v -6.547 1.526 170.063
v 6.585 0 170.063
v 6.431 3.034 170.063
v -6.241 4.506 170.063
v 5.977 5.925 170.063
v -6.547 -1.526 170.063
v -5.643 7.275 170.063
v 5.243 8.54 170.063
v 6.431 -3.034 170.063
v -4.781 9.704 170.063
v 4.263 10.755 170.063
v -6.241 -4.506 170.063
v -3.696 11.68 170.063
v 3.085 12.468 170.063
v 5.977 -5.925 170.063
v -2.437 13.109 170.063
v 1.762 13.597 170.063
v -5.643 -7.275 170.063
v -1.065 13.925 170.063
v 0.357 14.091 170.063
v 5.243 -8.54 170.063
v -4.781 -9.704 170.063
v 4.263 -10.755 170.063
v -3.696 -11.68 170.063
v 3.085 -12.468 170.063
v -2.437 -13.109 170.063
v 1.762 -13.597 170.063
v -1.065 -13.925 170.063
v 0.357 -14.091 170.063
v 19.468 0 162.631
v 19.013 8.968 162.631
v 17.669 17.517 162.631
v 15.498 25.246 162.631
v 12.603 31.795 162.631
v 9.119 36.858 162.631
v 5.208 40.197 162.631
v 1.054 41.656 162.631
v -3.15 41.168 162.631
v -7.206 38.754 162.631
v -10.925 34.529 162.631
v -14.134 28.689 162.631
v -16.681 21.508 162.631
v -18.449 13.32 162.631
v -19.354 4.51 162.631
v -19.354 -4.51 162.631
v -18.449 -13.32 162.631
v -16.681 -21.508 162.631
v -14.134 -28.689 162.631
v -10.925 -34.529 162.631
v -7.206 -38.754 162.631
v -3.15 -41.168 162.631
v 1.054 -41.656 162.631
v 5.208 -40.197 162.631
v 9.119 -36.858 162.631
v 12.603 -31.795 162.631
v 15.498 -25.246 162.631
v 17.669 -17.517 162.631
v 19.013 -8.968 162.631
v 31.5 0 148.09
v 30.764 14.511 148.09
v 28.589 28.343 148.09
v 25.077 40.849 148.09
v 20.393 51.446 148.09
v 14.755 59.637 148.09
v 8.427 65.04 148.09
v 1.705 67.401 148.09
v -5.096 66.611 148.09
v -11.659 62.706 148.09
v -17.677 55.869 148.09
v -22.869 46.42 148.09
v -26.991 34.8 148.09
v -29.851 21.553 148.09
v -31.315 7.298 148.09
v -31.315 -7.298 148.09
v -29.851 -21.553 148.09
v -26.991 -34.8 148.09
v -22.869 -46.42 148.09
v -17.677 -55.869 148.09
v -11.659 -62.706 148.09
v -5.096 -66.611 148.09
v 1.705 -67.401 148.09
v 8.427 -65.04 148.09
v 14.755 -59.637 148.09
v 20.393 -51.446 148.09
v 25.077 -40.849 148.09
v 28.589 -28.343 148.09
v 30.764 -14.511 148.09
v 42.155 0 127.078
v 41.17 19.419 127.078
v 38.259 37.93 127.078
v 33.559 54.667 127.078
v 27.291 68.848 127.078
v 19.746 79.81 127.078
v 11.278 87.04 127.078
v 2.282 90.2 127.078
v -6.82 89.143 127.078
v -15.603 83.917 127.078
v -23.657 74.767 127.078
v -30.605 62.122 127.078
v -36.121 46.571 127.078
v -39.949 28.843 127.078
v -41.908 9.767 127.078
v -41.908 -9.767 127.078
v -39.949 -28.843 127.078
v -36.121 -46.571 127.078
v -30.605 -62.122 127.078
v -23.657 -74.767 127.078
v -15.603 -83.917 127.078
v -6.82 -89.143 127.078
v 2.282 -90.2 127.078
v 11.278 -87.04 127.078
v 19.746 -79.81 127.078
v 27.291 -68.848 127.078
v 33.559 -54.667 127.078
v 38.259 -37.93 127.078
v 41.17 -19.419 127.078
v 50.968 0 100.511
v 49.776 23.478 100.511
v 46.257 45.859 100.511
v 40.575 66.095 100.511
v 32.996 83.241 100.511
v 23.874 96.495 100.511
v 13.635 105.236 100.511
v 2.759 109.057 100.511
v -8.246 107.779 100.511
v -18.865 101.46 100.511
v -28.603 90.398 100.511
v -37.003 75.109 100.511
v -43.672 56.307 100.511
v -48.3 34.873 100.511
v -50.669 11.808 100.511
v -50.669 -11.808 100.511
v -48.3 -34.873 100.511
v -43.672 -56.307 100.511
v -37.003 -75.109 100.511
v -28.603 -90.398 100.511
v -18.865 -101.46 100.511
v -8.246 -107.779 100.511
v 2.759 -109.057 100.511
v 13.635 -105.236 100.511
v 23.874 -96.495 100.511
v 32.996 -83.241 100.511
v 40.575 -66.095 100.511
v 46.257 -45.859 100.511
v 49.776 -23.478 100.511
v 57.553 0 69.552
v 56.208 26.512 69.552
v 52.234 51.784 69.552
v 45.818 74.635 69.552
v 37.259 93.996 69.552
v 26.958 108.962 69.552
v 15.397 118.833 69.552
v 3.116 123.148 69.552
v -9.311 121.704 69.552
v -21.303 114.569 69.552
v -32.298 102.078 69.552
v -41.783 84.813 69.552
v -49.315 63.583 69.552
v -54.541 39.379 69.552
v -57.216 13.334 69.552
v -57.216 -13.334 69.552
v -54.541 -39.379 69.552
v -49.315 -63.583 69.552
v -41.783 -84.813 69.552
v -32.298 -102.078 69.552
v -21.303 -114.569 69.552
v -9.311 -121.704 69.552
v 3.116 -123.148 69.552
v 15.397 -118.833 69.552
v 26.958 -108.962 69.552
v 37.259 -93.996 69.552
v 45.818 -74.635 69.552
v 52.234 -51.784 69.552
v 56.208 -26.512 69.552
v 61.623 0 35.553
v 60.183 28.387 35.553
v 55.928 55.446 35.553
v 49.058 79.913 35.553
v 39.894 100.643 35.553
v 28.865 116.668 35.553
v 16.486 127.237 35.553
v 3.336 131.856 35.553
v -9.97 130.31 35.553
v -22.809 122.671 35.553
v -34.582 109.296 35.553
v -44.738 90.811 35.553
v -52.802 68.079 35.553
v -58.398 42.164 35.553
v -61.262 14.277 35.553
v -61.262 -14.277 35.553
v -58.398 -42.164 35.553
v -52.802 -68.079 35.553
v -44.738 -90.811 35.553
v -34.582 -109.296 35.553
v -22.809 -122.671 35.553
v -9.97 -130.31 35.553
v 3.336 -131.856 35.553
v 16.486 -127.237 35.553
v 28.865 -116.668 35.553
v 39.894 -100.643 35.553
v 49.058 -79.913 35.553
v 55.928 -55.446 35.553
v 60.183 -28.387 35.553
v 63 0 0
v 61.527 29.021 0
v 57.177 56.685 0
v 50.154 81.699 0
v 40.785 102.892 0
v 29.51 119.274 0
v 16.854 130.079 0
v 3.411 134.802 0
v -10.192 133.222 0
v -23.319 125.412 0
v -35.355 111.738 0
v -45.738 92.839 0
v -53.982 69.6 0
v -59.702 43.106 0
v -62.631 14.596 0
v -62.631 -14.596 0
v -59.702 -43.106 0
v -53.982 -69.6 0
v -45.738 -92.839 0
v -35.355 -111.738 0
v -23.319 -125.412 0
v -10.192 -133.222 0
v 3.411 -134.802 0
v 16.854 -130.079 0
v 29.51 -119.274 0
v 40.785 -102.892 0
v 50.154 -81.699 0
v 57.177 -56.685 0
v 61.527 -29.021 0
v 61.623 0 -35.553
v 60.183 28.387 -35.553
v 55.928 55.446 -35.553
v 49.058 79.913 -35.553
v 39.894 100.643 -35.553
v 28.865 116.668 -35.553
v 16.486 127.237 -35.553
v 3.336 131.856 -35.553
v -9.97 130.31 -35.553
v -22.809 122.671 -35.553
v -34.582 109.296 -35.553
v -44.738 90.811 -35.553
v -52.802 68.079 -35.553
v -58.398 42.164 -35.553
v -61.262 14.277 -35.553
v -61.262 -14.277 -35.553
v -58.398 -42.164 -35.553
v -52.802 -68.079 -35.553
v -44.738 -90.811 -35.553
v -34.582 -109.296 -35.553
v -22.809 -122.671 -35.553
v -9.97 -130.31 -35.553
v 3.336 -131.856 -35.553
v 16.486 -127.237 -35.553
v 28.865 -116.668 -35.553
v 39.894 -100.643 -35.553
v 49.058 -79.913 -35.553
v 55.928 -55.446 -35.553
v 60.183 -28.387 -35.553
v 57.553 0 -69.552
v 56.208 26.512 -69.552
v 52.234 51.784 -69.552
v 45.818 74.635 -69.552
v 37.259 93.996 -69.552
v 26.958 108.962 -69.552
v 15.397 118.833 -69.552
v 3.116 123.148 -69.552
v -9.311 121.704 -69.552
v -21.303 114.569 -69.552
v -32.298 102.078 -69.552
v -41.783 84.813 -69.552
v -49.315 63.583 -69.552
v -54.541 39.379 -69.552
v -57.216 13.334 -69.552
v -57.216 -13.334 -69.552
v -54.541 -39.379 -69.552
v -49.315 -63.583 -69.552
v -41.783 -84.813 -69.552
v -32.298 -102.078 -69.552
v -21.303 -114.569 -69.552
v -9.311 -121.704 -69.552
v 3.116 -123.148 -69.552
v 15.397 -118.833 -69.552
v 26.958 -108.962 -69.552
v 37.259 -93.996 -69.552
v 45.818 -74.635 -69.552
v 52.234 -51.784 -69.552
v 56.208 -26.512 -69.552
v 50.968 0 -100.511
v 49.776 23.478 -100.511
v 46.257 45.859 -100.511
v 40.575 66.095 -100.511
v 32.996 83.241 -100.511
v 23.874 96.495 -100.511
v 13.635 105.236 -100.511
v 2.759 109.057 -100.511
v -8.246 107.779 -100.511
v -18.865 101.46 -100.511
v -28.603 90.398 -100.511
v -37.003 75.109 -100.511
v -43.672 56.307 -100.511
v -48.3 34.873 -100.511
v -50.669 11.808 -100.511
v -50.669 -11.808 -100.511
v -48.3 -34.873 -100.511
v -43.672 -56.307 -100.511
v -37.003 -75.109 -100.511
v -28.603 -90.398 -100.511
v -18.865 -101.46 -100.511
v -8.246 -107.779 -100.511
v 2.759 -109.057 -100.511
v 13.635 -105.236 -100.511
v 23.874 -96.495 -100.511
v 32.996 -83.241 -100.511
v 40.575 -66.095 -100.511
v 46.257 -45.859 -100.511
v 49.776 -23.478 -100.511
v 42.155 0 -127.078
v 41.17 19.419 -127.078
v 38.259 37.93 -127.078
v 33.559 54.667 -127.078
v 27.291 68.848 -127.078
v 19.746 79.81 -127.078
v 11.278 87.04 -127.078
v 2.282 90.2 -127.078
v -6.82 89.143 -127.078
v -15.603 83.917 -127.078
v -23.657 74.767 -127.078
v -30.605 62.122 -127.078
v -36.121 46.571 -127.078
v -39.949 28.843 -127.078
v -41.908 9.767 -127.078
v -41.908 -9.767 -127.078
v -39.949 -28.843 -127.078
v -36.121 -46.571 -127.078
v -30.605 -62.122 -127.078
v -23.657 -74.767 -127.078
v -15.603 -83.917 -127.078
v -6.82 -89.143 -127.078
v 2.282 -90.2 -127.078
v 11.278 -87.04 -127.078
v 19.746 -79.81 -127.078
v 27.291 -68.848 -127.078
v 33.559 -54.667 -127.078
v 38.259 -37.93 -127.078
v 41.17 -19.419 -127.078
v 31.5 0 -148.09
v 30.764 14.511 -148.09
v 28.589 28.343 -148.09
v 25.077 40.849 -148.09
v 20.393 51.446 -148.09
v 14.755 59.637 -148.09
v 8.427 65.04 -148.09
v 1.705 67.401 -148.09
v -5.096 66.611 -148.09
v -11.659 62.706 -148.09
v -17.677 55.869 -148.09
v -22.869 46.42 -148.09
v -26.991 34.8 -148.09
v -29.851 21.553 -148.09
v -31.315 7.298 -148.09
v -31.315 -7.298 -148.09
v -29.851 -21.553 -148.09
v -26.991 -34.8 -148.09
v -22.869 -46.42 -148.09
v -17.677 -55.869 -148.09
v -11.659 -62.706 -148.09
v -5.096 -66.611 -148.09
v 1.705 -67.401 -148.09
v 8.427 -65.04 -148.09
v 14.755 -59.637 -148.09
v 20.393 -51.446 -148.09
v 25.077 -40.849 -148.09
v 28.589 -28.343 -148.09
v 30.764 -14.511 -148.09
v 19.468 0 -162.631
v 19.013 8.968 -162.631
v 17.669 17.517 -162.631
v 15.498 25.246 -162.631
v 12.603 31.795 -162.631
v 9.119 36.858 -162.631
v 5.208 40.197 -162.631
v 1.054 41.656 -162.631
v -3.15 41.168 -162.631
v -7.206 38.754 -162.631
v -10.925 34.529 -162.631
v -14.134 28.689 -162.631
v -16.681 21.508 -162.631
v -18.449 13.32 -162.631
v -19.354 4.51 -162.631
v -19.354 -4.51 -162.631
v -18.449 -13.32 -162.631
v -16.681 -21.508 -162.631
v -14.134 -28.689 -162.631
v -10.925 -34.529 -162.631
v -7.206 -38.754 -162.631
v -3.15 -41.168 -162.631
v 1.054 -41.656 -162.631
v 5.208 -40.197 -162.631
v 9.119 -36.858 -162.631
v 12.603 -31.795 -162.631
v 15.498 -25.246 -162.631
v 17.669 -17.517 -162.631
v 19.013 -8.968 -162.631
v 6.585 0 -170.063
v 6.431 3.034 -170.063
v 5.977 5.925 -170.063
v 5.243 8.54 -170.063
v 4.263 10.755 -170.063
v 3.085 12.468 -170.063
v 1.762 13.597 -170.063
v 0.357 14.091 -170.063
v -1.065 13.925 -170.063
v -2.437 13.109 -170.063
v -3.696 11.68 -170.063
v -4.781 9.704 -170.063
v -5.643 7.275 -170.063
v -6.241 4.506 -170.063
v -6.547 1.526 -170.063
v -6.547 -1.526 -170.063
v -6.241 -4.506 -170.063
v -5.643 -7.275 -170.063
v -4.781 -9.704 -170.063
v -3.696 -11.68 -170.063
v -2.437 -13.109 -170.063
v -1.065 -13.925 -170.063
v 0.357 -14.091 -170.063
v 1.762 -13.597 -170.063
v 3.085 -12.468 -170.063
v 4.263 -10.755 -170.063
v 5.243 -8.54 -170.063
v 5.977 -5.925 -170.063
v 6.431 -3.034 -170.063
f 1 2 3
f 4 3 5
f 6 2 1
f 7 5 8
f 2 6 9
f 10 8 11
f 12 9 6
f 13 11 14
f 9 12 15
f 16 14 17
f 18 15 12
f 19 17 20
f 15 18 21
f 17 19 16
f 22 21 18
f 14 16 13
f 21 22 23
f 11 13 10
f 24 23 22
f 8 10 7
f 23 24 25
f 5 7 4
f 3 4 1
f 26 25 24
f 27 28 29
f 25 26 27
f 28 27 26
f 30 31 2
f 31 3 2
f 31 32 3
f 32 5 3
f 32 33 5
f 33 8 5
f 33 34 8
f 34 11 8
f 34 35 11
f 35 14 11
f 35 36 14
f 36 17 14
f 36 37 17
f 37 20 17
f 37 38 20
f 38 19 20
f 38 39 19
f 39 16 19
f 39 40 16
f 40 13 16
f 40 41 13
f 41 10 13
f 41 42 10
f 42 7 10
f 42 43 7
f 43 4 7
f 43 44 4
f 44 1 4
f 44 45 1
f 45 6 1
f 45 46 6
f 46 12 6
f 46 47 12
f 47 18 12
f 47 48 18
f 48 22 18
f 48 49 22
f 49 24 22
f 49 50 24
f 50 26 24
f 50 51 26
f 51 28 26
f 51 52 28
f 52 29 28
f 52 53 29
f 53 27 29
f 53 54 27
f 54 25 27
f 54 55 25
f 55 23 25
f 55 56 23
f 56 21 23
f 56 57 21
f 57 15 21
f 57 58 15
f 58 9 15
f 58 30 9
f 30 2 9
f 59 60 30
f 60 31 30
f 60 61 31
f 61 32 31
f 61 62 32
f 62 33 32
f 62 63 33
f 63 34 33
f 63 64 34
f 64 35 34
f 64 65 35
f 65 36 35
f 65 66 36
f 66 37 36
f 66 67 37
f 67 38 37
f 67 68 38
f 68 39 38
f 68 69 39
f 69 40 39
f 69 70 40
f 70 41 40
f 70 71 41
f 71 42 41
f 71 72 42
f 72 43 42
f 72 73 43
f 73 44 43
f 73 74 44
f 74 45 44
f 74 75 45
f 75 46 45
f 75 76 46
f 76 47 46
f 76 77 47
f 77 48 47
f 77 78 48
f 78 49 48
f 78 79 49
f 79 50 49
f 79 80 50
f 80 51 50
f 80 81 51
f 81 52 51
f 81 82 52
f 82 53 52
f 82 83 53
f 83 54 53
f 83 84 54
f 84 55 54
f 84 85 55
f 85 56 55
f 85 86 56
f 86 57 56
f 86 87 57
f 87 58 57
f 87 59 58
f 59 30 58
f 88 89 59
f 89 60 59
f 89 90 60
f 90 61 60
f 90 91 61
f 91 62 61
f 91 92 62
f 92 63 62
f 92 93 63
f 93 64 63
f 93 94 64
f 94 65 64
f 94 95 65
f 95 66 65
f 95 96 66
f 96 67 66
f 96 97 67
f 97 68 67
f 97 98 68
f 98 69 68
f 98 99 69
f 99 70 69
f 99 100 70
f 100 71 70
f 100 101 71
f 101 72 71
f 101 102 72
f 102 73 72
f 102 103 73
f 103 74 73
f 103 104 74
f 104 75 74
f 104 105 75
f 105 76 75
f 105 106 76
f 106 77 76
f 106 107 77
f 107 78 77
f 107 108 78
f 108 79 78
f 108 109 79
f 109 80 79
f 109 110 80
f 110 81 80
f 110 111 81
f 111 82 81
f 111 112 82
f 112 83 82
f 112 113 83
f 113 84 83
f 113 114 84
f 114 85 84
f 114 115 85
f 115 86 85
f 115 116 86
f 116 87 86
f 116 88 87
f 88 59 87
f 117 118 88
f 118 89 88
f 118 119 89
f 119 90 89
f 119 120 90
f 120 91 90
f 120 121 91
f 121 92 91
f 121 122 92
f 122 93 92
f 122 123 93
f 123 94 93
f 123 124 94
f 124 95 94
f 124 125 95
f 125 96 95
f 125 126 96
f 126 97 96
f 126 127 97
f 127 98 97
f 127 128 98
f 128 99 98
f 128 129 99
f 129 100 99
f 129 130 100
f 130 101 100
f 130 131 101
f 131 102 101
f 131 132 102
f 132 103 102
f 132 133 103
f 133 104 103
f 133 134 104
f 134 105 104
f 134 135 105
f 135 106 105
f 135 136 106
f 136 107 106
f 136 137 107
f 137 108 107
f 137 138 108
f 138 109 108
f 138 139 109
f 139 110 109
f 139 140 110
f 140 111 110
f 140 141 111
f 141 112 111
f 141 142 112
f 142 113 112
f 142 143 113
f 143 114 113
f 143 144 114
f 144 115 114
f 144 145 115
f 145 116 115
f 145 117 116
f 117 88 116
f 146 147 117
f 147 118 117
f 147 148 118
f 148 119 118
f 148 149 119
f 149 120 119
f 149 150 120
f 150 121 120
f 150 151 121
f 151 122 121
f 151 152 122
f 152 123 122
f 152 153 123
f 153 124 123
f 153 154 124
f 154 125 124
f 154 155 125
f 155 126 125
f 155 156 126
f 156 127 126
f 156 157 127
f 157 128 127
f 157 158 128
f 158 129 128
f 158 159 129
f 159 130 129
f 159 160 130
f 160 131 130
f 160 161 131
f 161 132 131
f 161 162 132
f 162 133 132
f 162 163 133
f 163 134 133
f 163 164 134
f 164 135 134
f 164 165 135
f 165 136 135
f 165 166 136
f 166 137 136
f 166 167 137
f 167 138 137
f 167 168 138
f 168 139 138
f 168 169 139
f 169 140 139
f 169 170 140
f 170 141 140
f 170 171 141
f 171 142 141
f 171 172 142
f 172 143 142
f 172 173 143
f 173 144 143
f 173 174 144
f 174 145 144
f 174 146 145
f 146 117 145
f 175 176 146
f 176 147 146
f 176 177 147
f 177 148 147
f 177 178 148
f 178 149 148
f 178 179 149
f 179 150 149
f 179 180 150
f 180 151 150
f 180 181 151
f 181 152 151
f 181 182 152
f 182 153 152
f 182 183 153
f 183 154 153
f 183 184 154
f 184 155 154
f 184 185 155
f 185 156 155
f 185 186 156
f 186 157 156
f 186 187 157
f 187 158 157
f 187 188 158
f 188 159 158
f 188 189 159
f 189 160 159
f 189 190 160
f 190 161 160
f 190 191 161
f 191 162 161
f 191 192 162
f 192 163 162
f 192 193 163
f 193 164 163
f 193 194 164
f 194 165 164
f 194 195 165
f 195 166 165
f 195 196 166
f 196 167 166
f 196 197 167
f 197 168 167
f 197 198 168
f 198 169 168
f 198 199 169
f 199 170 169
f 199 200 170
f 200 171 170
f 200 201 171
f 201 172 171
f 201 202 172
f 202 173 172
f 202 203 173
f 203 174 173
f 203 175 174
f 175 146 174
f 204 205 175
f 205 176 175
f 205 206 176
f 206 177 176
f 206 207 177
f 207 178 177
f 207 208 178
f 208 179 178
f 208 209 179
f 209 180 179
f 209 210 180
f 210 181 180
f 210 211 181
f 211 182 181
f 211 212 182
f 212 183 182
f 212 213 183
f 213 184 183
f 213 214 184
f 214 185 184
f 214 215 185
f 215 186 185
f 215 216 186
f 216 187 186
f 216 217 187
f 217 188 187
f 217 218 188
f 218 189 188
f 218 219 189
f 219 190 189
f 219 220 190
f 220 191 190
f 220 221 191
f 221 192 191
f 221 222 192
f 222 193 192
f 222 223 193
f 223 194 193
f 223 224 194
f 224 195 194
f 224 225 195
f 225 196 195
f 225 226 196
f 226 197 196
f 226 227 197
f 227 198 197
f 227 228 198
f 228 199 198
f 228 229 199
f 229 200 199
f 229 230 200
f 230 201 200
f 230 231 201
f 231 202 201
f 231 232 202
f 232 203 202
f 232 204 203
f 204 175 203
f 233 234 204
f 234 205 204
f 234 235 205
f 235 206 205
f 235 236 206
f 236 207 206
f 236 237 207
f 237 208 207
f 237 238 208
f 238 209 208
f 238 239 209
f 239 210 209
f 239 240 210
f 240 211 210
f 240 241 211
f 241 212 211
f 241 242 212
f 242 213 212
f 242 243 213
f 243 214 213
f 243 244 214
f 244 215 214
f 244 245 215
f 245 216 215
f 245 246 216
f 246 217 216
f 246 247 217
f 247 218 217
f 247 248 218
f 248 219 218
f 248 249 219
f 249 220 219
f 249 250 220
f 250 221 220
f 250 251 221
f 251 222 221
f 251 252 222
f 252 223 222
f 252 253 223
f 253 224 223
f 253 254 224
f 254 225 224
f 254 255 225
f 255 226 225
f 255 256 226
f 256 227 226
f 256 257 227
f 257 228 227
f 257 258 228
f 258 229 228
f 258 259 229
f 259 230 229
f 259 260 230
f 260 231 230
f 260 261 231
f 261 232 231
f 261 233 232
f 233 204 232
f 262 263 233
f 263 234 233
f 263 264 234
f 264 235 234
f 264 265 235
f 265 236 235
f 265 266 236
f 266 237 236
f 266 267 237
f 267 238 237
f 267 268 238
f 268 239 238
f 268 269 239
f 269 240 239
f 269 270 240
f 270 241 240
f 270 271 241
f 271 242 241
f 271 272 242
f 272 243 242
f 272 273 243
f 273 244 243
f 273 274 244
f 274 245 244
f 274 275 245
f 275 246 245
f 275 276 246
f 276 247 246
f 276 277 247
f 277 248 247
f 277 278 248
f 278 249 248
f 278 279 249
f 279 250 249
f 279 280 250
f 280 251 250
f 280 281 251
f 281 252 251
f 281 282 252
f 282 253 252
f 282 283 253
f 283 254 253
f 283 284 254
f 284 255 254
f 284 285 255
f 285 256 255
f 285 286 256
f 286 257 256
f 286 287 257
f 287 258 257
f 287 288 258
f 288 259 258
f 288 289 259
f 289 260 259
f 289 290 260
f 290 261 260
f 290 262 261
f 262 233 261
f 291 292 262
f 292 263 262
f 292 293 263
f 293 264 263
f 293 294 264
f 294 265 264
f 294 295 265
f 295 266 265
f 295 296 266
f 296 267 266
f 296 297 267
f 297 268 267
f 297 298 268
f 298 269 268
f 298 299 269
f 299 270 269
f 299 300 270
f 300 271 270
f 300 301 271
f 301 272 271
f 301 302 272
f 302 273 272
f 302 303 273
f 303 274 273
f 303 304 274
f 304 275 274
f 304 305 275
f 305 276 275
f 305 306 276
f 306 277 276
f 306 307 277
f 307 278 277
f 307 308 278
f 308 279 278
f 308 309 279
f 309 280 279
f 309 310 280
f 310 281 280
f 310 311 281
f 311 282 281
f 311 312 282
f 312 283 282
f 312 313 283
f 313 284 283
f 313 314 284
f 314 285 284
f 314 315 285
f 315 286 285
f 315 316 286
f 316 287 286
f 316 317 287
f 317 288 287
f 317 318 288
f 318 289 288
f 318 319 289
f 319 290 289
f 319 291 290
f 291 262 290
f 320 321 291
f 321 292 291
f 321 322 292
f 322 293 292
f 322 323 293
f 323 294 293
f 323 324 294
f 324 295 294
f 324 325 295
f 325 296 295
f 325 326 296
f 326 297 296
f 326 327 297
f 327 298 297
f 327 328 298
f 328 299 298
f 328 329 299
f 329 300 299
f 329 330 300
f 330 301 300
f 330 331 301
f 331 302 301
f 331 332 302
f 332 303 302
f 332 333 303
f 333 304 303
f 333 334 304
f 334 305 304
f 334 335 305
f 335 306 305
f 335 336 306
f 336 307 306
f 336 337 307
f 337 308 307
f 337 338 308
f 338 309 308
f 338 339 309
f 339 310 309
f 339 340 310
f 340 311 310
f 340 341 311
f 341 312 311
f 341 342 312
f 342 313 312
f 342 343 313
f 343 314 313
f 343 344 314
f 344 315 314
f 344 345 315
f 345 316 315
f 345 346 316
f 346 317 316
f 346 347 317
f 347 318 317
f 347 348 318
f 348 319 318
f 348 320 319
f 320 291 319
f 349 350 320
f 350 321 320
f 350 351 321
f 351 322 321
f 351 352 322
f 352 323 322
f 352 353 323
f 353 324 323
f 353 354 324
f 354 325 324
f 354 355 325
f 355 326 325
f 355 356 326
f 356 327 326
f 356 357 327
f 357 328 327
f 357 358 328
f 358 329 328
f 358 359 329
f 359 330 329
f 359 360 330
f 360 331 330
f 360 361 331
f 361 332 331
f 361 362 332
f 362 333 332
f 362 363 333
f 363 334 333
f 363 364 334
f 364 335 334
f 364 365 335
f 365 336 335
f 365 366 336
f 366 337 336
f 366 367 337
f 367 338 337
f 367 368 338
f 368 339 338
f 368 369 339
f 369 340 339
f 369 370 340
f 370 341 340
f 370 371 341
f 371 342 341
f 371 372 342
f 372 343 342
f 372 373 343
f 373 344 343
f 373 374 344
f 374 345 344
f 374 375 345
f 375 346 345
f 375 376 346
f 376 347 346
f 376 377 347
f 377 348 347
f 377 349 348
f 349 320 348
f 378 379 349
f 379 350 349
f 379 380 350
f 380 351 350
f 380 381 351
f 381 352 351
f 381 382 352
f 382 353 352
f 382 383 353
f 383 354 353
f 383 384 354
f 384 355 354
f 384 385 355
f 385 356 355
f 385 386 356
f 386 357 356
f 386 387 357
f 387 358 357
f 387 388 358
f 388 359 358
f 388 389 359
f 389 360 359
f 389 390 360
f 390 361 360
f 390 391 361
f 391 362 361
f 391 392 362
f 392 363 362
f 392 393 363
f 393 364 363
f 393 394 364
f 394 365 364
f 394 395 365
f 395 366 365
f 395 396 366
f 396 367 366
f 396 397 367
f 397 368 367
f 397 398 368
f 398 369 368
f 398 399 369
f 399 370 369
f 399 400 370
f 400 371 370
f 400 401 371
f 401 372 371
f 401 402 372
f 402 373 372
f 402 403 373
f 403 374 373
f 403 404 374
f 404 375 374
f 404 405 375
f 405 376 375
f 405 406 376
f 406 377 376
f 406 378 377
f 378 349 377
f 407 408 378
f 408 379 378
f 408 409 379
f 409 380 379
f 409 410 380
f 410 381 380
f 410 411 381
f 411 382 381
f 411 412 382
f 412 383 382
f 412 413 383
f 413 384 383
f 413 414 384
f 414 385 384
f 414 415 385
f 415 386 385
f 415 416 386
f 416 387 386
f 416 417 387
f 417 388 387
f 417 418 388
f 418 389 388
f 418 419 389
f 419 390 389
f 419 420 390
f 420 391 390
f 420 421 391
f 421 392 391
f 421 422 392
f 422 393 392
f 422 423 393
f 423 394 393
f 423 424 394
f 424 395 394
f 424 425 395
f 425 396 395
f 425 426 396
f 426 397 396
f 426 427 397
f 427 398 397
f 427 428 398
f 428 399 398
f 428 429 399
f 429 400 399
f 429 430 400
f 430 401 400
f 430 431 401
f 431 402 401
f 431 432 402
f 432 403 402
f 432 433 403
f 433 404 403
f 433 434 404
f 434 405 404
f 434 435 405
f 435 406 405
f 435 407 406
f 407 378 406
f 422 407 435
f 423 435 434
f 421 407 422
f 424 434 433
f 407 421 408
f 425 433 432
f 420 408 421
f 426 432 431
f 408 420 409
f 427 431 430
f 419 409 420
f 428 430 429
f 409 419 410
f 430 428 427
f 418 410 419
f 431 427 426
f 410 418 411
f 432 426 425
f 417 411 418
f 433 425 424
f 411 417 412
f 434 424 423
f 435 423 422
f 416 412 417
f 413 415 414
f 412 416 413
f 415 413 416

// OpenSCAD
// Generated by SolidPython 1.0.1 on 2020-07-29 00:46:48


scale(v = [7, 15, 19]) {
	sphere(r = 9);
}
/***********************************************
*********      SolidPython code:      **********
************************************************
 
# import packages: SolidPython
from solid import *
from solid.utils import *
from itertools import chain, combinations, permutations


class Resize:

    def __init__(self, scad_file):
        self.scad_file = scad_file
        #self.scad_file = import_scad(scad_file)
        # cone/cylinder param:
        self.r1 = 0
        self.r2 = 0
        self.h = 0
        # rectangular prism param:
        self.w = 0
        self.l = 0
        # ellipse param:
        self.r = 0

    # import OpenScad code (file name corresponds to shape)


    # classify shape + parameters
    def assign(self, param1, param2, param3):
        if self.scad_file == 'cone.scad':
            self.r1 = param1
            self.r2 = param2
            self.h = param3
        elif self.scad_file == 'cylinder.scad':
            self.r1 = param1
            self.r2 = param2
            self.h = param3
        elif self.scad_file == 'rectangularPrism.scad':
            self.h = param1
            self.l = param2
            self.w = param3
        else:
            self.r = param1
            self.h = param2

    # resize parameters
    def iterate(self):
        x = range(3, 20, 2)
        i = 1
        if self.scad_file == 'cone.scad':
            tempList = list(permutations(x, 2))
            for temp in tempList:
                param1 = temp[0]
                param2 = temp[1]
                filepath = 'produced_scad_files/' + 'cone' + str(param1) + '_' + str(param2) + '_' + '.scad'
                scad_render_to_file(cylinder(h=param1, r1=param2, r2=0), filepath)

        elif self.scad_file == 'cylinder.scad':
            tempList = list(permutations(x, 3))
            for temp in tempList:
                param1 = temp[0]
                param2 = temp[1]
                filepath = 'produced_scad_files/' + 'cylinder' + str(param1) + '_' + str(param2) + '_' + '.scad'
                scad_render_to_file(cylinder(h=param1, r1=param2, r2=param2), filepath)

        elif self.scad_file == 'rectangularPrism.scad':
            tempList = list(permutations(x, 3))
            for temp in tempList:
                param1 = temp[0]
                param2 = temp[1]
                param3 = temp[2]
                filepath = 'produced_scad_files/' + 'rectangularPrism' + str(param1) + '_' + str(param2) + '_' + str(
                    param3) + '.scad'
                scad_render_to_file(cube(size=(param1, param2, param3)), filepath)

        elif self.scad_file == 'ellipse.scad':
            tempList = list(permutations(x, 4))
            for temp in tempList:
                param1 = temp[0]
                param2 = temp[1]
                param3 = temp[2]
                param4 = temp[3]
                filepath = 'produced_scad_files/' + 'ellipse' + str(param1) + '_' + str(param2) + '_' + str(param3) + '_' + str(param4) + '.scad'
                scad_render_to_file(scale([param1, param2, param3])(sphere(r=param4)), filepath)

    def render_to_scadfile(self):
        scad_render_to_file(scad, 'example.scad') 
 
************************************************/
